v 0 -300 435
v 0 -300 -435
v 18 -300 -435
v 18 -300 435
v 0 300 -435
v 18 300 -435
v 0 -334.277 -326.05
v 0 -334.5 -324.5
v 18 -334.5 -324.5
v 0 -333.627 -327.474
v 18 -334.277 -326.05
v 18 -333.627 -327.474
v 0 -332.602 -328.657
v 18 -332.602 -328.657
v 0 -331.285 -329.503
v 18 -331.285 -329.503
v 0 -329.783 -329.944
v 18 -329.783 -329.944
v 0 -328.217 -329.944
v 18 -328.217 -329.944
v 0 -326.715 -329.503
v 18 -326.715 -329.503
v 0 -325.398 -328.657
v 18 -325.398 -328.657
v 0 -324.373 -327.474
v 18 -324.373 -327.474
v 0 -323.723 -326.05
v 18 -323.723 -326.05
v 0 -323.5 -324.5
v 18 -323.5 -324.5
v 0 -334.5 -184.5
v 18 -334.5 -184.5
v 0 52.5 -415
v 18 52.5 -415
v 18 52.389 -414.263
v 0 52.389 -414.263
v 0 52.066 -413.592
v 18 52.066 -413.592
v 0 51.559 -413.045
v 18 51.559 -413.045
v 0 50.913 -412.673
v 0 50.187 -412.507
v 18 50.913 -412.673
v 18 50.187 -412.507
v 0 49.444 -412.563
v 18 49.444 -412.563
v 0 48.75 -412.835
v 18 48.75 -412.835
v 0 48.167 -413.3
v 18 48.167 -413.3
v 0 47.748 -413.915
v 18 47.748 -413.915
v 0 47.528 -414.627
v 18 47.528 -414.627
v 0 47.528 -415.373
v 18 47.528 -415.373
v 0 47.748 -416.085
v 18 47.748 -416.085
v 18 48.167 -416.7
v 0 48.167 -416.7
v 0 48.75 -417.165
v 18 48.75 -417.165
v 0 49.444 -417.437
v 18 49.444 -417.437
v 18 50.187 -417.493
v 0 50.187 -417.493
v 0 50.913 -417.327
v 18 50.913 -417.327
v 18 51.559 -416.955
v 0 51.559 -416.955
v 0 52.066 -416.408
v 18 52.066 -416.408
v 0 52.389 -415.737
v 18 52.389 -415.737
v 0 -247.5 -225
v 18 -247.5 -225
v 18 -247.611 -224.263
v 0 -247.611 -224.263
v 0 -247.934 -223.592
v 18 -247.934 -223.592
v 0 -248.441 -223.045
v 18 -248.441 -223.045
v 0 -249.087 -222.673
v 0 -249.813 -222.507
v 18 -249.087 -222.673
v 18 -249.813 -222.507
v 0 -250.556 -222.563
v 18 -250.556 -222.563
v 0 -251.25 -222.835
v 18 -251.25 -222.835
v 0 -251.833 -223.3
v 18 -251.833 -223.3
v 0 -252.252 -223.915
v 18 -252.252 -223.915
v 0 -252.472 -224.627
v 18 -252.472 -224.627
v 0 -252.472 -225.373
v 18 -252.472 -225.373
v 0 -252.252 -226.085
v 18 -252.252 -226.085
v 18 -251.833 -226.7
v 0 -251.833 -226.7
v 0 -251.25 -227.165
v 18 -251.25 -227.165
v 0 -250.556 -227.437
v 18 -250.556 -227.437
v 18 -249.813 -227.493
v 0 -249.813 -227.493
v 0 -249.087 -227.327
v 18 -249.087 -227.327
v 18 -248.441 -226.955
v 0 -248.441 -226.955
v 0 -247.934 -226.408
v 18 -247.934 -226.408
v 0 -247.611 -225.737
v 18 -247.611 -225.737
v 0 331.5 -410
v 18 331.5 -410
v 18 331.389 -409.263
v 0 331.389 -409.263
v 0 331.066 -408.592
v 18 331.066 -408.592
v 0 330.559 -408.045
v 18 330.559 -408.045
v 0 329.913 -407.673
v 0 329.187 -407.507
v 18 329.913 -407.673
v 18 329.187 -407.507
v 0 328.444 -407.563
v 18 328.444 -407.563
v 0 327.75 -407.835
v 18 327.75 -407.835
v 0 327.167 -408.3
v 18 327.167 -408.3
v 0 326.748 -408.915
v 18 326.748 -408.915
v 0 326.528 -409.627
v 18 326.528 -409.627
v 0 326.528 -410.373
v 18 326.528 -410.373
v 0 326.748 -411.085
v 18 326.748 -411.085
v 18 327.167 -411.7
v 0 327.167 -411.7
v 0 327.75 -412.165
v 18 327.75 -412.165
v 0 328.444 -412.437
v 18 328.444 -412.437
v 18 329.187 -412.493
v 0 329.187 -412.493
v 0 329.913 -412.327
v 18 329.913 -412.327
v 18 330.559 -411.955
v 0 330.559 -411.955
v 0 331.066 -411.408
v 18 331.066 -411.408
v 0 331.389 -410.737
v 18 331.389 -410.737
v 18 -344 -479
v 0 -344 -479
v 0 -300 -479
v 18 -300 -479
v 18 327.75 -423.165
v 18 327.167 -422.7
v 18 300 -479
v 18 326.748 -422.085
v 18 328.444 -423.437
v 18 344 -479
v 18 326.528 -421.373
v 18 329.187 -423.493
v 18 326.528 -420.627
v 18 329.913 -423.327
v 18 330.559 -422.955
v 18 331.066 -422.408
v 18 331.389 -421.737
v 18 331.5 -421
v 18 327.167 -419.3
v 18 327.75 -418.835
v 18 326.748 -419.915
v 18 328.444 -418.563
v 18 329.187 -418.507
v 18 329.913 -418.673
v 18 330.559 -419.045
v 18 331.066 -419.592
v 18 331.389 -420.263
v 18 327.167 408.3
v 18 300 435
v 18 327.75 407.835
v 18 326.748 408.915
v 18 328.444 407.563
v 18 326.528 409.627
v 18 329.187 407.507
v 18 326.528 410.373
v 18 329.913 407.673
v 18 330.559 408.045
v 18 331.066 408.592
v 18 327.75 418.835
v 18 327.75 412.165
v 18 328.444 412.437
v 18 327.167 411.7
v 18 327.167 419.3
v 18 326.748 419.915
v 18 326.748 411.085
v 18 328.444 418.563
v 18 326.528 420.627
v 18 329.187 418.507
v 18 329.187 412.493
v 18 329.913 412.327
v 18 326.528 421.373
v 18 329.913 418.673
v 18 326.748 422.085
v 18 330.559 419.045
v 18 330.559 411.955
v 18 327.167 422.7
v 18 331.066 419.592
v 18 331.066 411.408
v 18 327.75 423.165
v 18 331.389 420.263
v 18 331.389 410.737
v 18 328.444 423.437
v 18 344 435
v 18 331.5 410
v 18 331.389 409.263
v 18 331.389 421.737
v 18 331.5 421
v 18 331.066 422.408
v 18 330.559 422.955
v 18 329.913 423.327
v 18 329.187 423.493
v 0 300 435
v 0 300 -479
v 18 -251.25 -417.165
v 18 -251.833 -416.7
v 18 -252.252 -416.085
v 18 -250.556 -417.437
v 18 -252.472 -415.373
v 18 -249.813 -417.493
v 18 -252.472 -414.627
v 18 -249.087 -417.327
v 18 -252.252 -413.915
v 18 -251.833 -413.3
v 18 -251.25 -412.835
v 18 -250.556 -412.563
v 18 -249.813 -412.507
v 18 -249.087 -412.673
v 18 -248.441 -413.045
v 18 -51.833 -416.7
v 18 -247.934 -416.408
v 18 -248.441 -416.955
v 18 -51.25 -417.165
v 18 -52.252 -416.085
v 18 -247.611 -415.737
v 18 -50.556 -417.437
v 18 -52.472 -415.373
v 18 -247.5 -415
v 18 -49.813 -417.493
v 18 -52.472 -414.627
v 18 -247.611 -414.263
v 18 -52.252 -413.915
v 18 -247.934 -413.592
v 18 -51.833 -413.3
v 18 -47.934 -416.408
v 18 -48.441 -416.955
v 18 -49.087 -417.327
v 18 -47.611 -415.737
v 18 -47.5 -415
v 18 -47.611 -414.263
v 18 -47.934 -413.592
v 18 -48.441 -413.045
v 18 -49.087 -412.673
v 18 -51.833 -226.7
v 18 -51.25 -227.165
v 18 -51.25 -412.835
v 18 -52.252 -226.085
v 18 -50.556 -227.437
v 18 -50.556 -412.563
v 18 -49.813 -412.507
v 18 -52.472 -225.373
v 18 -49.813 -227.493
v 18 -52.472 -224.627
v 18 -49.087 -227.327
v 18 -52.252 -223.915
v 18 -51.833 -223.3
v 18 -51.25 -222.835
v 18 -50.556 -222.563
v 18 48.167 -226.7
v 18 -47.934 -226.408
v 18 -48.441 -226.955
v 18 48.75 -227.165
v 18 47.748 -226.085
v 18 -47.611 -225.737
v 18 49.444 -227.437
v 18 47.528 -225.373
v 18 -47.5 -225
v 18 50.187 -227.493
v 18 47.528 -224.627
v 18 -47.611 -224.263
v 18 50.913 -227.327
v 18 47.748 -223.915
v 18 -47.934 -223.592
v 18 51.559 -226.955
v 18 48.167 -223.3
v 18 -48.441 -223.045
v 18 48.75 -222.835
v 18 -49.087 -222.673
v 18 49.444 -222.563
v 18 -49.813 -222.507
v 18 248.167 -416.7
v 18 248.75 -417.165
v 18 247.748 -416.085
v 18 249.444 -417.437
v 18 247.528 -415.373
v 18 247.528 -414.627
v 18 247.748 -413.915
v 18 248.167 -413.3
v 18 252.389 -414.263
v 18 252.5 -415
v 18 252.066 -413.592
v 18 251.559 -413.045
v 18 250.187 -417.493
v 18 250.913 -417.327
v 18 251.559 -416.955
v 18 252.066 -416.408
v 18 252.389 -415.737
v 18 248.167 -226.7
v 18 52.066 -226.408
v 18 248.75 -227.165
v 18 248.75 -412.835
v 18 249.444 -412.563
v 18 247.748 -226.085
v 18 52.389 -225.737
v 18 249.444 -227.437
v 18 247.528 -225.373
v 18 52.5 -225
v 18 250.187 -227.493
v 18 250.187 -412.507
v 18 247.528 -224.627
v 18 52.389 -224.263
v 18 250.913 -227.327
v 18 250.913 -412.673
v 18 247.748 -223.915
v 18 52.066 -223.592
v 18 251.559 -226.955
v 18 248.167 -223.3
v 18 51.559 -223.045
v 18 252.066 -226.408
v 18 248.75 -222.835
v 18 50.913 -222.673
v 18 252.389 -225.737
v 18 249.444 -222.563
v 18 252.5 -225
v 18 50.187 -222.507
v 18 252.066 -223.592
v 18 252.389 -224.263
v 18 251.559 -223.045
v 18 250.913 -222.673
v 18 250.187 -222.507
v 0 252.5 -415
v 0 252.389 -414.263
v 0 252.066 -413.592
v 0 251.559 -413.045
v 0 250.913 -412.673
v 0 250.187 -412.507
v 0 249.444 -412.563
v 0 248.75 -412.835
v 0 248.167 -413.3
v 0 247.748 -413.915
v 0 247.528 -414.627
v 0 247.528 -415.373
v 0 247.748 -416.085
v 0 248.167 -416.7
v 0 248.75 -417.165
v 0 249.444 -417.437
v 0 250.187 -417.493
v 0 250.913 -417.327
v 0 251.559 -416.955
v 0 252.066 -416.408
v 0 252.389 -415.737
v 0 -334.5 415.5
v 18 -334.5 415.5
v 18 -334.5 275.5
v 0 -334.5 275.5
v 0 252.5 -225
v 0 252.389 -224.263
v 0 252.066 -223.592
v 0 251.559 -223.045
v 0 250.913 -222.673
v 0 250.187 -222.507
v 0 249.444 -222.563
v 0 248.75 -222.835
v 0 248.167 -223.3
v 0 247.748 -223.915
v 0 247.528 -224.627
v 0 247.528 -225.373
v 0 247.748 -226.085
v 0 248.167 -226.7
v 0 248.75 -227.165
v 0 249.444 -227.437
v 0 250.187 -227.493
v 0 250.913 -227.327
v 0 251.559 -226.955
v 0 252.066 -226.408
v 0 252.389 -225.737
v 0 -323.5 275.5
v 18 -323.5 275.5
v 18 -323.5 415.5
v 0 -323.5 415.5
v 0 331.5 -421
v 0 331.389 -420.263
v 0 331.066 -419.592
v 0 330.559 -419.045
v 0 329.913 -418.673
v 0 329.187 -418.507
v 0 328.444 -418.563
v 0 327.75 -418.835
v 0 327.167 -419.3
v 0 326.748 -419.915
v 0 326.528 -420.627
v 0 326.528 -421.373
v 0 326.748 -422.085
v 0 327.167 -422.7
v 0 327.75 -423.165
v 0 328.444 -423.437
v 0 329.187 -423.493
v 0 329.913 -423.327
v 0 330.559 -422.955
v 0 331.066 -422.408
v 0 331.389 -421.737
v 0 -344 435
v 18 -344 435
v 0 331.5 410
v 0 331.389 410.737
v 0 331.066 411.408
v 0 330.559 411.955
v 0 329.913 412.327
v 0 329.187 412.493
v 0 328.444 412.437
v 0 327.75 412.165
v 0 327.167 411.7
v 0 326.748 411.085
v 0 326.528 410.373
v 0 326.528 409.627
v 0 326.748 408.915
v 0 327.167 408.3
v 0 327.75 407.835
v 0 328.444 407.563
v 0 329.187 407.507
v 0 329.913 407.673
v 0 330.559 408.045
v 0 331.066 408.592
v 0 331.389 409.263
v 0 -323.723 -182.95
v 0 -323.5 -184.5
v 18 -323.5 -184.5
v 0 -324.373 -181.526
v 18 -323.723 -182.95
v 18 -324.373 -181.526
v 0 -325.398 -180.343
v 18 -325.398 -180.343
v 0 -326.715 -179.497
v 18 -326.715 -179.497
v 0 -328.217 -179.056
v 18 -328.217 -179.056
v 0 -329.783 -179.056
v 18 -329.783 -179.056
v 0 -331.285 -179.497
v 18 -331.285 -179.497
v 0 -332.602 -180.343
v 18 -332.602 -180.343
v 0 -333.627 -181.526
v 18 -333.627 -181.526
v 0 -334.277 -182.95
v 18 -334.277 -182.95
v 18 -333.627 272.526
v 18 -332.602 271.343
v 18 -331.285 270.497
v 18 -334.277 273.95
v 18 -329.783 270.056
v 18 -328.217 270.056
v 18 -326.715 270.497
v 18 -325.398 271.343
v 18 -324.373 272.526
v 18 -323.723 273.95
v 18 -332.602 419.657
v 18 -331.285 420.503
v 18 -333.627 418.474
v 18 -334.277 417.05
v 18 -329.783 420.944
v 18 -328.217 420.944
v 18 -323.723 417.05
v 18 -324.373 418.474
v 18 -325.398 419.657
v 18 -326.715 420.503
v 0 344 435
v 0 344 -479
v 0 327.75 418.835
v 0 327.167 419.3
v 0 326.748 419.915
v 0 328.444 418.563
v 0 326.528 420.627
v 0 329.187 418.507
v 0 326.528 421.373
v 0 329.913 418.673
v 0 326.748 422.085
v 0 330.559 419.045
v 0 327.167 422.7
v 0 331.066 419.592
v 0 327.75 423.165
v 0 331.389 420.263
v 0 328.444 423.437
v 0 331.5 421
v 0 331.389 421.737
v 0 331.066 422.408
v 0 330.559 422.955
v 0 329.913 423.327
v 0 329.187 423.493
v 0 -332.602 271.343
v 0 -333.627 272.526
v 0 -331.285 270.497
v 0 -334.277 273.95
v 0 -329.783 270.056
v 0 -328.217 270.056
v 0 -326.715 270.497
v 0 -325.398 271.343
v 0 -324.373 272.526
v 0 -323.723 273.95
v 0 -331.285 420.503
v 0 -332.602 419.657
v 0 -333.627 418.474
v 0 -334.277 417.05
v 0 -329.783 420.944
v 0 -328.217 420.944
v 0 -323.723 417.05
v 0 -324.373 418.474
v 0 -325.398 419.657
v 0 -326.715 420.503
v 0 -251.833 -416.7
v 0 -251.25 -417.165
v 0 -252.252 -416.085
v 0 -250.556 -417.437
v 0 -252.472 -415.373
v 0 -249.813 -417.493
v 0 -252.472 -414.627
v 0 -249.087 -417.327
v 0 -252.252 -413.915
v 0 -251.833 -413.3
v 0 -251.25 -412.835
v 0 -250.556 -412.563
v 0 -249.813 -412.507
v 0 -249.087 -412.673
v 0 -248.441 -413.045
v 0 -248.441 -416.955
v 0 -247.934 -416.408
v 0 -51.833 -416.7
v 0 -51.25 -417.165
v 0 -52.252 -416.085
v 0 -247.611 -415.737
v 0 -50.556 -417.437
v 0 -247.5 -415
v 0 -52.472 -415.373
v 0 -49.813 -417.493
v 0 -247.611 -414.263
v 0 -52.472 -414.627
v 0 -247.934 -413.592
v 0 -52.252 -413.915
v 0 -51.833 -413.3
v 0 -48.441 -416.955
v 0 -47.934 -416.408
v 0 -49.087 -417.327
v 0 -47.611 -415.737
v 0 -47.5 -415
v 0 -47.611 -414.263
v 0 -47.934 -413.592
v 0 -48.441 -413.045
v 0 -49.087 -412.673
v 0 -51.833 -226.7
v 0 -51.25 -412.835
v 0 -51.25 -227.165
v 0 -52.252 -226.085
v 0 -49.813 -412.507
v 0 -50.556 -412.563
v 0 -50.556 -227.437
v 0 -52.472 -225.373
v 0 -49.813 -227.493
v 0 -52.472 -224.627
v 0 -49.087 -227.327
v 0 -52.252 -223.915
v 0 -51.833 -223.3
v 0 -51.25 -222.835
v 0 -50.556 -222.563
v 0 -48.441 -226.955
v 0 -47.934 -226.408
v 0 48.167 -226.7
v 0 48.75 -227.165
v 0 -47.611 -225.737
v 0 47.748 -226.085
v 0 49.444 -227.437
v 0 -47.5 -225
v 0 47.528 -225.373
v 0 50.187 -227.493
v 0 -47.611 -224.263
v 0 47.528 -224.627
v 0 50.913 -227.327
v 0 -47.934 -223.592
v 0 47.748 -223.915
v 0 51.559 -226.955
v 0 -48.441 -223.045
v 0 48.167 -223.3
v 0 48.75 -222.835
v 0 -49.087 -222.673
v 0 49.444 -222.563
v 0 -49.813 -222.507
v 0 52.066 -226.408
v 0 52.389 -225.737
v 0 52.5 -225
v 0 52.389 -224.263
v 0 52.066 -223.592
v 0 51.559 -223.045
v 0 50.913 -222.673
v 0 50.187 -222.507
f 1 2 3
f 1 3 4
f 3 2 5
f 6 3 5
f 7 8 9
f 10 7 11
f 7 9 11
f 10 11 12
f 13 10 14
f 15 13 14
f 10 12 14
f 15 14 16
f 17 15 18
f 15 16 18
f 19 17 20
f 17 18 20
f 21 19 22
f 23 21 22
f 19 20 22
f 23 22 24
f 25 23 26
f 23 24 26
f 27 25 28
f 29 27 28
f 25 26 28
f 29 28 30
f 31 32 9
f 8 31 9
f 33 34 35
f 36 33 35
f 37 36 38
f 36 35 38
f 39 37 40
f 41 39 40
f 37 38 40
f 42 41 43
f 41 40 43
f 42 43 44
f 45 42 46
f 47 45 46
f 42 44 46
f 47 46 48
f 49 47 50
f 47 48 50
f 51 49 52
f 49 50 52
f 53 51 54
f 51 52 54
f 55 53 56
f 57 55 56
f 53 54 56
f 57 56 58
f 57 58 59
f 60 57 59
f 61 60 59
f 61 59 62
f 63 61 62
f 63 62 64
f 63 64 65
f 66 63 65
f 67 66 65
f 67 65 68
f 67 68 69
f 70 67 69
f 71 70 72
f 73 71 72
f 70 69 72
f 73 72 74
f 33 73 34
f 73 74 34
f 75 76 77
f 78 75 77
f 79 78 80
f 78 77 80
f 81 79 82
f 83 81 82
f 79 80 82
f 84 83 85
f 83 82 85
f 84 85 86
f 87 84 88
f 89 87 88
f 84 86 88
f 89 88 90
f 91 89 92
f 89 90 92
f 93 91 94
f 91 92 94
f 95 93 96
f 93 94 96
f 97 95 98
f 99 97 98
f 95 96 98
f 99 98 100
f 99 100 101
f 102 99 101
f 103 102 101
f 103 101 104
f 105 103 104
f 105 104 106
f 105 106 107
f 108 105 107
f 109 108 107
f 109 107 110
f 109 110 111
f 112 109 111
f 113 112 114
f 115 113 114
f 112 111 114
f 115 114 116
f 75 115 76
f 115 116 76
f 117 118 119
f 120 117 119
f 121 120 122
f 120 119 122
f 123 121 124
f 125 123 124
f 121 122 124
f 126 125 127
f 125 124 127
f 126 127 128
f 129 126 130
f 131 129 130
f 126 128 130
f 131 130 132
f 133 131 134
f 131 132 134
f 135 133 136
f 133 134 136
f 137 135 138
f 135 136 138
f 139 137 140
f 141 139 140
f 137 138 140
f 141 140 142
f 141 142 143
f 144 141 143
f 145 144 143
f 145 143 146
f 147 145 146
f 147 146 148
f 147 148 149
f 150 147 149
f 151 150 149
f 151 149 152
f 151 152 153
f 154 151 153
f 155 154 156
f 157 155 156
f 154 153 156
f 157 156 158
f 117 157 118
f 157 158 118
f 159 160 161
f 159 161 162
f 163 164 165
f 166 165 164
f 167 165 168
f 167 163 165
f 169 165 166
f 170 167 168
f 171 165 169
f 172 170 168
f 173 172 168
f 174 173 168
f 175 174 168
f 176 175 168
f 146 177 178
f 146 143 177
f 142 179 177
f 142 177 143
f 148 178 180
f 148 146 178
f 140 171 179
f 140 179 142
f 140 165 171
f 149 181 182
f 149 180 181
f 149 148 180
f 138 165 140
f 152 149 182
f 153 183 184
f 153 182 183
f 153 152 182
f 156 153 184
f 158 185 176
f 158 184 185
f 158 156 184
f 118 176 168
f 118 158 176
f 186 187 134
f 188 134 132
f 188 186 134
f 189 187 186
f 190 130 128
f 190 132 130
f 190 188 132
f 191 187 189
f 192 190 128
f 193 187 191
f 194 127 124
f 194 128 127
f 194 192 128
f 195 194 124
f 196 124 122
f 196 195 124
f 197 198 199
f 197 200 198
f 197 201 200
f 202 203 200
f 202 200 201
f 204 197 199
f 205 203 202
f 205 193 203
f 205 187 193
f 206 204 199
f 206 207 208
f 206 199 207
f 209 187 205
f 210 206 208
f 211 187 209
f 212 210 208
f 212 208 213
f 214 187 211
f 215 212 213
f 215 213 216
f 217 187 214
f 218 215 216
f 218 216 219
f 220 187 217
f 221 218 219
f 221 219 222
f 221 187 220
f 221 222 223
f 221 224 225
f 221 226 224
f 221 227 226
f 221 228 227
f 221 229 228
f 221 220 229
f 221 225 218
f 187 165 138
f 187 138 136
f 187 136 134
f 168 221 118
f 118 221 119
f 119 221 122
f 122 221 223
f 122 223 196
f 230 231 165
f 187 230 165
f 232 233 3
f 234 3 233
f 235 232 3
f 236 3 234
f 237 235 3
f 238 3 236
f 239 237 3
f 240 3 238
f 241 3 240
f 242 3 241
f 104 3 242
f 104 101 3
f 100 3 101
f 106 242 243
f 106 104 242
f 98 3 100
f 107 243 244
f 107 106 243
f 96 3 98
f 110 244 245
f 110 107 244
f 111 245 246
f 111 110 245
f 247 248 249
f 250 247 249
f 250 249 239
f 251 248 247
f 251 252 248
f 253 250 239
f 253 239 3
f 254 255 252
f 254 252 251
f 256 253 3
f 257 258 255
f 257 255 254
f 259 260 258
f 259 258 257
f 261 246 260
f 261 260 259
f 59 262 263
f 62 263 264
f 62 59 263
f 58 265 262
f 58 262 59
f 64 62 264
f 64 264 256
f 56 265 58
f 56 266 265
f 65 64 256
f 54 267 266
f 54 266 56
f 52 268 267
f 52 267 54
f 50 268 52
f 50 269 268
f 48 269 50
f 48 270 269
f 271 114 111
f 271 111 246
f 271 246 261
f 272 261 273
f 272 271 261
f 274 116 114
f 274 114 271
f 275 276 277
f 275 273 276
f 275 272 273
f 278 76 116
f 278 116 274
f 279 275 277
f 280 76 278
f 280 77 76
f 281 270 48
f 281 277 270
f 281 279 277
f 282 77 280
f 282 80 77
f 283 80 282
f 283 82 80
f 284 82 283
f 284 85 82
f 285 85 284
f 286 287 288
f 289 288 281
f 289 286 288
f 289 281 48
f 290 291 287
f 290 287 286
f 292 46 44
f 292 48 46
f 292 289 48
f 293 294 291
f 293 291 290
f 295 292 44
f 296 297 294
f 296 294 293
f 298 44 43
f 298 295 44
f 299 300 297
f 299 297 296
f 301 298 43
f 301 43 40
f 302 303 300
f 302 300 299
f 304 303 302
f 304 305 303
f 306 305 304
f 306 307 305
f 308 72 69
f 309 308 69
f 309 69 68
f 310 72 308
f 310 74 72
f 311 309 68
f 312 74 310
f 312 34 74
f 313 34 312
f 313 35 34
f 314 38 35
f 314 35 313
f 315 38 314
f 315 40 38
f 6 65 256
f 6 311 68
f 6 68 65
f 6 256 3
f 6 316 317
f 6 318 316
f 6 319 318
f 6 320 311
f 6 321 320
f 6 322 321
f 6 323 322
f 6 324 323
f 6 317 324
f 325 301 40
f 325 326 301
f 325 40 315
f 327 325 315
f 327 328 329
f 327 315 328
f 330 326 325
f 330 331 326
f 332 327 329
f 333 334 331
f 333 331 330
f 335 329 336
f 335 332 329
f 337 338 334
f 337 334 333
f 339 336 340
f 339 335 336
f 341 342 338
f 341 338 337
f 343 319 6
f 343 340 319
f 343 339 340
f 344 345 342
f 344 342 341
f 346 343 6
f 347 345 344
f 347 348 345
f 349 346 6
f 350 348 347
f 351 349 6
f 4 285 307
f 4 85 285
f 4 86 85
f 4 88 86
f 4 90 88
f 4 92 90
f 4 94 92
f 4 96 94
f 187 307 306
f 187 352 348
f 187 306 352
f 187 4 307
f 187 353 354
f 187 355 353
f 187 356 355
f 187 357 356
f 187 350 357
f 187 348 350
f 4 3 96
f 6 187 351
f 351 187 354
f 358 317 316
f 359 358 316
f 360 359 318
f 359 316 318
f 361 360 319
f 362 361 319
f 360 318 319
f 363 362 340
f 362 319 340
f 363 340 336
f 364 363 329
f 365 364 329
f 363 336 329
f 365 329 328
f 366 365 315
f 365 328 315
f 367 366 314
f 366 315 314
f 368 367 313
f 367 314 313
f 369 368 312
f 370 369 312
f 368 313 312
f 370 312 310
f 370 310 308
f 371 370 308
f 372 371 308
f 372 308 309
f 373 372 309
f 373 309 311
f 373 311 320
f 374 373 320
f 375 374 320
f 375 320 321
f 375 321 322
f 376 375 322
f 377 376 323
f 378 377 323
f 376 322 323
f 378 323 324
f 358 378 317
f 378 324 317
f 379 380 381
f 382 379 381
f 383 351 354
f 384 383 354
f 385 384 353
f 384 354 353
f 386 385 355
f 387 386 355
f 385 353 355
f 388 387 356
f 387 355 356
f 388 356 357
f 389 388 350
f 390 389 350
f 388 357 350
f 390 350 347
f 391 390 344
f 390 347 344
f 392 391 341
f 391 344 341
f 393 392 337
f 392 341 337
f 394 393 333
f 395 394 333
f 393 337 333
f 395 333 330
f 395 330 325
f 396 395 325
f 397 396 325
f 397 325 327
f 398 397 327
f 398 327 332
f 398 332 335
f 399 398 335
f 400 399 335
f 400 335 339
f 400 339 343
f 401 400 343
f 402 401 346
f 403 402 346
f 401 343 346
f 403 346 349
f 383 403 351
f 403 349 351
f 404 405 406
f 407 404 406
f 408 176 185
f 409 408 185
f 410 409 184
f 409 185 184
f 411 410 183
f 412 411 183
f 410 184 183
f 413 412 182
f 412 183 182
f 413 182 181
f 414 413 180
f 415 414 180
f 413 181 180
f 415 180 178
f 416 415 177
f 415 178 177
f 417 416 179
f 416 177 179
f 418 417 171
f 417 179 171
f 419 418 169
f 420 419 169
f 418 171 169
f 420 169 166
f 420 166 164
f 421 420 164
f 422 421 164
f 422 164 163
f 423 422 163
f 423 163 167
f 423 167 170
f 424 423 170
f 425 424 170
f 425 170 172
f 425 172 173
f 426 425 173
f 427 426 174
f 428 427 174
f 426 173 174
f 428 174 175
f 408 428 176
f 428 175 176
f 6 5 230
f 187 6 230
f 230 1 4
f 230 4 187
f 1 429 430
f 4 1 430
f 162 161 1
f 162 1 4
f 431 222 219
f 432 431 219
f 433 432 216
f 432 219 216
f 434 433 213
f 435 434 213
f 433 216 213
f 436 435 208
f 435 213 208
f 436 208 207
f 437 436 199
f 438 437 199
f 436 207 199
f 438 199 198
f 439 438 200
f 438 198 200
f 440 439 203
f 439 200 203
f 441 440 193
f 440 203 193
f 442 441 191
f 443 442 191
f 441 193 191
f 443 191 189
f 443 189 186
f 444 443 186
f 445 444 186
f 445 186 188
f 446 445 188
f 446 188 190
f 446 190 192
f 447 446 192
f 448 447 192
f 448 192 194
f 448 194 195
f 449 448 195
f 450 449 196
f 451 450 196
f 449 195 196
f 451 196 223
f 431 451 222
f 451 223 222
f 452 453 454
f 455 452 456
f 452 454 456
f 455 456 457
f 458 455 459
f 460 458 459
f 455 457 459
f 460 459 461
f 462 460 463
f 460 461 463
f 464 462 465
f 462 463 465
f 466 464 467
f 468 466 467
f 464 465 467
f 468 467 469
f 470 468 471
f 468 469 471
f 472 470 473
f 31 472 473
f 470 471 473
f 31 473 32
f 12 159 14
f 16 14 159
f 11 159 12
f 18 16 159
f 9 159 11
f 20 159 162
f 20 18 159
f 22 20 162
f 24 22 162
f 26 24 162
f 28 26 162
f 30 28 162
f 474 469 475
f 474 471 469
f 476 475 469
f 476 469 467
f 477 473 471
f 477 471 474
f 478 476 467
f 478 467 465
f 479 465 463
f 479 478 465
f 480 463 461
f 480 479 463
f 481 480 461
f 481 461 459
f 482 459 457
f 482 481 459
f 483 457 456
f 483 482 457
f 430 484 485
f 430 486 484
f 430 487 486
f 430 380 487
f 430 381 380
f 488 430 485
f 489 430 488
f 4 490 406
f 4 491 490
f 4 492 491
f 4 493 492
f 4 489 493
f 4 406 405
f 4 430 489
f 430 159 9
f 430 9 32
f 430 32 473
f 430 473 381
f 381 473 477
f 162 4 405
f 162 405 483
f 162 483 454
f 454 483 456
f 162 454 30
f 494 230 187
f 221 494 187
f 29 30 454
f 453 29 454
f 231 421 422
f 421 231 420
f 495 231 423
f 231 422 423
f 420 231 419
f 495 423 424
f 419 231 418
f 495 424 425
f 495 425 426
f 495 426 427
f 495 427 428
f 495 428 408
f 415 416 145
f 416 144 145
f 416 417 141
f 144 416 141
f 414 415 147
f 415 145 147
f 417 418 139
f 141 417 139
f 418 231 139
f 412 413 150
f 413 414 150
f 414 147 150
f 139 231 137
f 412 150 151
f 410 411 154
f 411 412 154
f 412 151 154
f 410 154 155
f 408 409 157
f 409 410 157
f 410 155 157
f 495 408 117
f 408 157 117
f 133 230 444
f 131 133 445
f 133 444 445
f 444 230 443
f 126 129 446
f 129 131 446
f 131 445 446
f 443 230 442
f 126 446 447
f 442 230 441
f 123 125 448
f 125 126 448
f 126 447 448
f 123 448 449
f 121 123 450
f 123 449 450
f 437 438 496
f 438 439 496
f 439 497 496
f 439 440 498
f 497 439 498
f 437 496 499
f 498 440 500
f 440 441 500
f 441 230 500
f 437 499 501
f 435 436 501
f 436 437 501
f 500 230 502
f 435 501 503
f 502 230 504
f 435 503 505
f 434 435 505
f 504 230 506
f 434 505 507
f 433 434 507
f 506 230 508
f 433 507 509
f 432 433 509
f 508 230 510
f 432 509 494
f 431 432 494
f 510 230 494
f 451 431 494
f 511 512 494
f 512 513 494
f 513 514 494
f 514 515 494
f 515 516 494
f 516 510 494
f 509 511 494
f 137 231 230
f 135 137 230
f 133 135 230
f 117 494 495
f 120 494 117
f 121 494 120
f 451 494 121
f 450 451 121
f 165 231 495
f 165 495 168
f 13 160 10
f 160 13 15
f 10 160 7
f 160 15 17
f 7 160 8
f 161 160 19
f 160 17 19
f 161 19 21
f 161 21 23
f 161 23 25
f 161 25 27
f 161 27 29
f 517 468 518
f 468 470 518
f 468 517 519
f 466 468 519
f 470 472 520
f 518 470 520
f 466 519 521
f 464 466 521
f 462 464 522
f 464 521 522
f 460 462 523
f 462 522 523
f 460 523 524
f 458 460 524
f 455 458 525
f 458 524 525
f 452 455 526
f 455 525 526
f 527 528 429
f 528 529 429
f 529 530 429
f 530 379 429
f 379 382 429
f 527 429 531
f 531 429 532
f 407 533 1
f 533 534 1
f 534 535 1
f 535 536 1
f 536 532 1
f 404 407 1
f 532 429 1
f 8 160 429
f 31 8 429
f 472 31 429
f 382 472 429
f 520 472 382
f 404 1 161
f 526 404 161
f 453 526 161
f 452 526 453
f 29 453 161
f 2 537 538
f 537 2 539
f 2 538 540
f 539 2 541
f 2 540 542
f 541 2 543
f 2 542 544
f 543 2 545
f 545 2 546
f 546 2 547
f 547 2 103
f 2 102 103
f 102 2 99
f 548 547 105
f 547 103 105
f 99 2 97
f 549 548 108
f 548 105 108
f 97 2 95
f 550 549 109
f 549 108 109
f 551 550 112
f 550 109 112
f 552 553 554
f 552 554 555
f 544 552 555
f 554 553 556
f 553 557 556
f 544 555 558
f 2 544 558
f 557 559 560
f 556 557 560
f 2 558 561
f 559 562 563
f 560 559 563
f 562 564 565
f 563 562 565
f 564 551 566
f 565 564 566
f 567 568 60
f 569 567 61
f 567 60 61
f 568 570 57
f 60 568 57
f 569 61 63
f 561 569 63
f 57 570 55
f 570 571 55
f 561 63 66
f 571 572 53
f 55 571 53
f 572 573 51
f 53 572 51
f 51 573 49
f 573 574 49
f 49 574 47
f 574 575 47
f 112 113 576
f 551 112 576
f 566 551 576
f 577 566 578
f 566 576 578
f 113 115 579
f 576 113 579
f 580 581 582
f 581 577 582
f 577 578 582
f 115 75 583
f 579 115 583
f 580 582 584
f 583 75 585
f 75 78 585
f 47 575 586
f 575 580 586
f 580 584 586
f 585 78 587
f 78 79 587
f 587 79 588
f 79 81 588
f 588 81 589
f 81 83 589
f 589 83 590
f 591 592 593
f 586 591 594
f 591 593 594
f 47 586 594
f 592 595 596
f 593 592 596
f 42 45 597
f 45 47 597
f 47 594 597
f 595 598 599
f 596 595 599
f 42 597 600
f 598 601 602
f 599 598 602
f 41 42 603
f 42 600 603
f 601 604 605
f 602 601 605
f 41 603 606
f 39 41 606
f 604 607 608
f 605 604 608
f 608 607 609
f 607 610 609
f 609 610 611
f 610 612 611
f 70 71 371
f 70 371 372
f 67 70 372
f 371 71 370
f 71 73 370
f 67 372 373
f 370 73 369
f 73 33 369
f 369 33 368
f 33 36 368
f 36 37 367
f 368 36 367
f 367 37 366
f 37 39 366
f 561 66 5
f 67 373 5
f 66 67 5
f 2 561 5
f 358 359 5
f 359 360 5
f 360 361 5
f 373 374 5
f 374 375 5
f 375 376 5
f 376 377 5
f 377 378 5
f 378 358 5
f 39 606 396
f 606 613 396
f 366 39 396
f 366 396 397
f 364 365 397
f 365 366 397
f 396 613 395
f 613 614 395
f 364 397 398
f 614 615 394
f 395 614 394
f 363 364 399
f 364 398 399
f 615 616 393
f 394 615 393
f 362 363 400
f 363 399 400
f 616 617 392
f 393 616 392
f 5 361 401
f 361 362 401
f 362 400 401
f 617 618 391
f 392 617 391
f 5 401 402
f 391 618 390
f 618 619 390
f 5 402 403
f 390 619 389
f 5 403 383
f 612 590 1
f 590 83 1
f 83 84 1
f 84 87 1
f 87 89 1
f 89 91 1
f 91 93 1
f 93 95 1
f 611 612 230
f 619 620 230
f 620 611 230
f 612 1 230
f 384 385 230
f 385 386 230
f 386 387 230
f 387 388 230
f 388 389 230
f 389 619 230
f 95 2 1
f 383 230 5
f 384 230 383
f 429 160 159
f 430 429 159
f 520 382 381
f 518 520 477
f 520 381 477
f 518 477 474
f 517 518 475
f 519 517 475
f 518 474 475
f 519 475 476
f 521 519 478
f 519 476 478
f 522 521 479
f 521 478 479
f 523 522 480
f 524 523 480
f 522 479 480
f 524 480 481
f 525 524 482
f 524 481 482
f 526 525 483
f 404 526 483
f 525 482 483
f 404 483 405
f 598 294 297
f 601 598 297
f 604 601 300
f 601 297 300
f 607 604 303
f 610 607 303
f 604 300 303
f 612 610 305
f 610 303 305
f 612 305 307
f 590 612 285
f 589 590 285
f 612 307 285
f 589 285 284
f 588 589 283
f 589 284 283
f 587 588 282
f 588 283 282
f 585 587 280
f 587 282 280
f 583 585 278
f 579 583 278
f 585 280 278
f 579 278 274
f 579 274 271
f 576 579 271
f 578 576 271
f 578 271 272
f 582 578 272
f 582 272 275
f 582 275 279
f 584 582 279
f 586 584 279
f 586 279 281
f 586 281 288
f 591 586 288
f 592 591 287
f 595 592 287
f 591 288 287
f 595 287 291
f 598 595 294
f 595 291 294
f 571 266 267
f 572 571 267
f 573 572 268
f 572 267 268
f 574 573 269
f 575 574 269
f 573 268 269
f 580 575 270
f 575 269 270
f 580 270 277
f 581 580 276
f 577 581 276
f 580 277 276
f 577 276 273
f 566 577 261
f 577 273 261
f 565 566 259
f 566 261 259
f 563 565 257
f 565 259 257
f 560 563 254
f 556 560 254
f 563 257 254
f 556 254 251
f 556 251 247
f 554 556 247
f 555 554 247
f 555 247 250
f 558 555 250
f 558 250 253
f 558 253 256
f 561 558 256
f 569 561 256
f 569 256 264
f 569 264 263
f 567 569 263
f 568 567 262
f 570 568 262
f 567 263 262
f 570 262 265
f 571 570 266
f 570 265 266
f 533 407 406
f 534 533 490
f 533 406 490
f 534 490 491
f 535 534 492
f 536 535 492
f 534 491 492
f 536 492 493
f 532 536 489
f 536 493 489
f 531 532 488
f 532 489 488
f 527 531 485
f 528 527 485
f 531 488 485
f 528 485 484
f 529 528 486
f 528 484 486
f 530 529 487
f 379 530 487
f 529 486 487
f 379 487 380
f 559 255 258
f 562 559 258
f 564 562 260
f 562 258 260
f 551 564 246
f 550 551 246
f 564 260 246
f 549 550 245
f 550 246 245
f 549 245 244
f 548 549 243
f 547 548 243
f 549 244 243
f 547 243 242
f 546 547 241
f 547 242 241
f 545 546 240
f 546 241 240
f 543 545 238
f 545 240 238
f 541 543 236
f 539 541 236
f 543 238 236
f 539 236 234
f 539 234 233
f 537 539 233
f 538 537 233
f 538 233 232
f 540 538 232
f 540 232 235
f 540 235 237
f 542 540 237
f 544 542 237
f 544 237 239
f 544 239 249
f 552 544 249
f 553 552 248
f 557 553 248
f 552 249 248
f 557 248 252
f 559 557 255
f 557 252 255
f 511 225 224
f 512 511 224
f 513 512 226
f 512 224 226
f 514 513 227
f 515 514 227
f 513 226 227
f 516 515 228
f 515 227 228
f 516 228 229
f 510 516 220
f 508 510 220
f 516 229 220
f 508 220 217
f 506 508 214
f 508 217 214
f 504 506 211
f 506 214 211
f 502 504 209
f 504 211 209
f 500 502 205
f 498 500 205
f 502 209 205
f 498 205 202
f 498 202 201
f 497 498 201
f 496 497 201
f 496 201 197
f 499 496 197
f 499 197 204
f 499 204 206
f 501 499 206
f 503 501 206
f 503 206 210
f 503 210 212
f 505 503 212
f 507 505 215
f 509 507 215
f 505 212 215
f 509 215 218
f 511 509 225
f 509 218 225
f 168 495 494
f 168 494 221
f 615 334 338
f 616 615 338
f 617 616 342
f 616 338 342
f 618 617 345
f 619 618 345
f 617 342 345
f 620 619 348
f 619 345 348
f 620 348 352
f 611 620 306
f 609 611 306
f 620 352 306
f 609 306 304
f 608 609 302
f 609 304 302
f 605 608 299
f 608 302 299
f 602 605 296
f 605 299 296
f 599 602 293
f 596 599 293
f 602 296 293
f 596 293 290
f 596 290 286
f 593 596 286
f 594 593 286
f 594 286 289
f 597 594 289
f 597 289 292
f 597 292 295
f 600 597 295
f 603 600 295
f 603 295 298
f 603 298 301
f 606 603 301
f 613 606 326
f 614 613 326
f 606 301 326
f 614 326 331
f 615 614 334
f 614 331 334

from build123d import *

# Parameters (mm, degrees)
F0_W     = 600
F0_H     = 870
F1_DEPTH = 18
F2_W     = 18
F2_H     = 44
F3_DEPTH = 914
F4_R     = 2.5
F5_DEPTH = 18


with BuildPart() as f1:
    # F0 (on Right) → F1 (new body)
    with BuildSketch(Plane.YZ):
        Rectangle(F0_W, F0_H)
    extrude(amount=F1_DEPTH)


with BuildPart() as f3:
    # F2 (on face) → F3 (new body)
    with BuildSketch(Plane.XY.offset(435)):
        with Locations((9, -322)):
            Rectangle(F2_W, F2_H)
        with Locations((9, 322)):
            Rectangle(F2_W, F2_H)
    extrude(amount=-F3_DEPTH)


with BuildPart() as f5_tool:
    # F4 (on face) → F5 (new body)
    with BuildSketch(Plane.YZ.offset(18)):
        with Locations((250, -415)):
            Circle(F4_R)
        with Locations((250, -225)):
            Circle(F4_R)
        with Locations((50, -225)):
            Circle(F4_R)
        with Locations((50, -415)):
            Circle(F4_R)
        with Locations((-250, -415)):
            Circle(F4_R)
        with Locations((-50, -225)):
            Circle(F4_R)
        with Locations((-50, -415)):
            Circle(F4_R)
        with Locations((-250, -225)):
            Circle(F4_R)
        with Locations((329, 421)):
            Circle(F4_R)
        with Locations((329, 410)):
            Circle(F4_R)
        with Locations((329, -410)):
            Circle(F4_R)
        with Locations((329, -421)):
            Circle(F4_R)
        with BuildLine():
            Line((-323.5, 345.5), (-323.5, 415.5))
            ThreePointArc((-323.5, 415.5), (-329, 421), (-334.5, 415.5))
            Line((-334.5, 415.5), (-334.5, 345.5))
            Line((-334.5, 345.5), (-323.5, 345.5))
        make_face()
        with BuildLine():
            Line((-323.5, 275.5), (-323.5, 345.5))
            Line((-323.5, 345.5), (-334.5, 345.5))
            Line((-334.5, 345.5), (-334.5, 275.5))
            ThreePointArc((-334.5, 275.5), (-329, 270), (-323.5, 275.5))
        make_face()
        with BuildLine():
            ThreePointArc((-323.5, -184.5), (-329, -179), (-334.5, -184.5))
            Line((-334.5, -184.5), (-334.5, -324.5))
            ThreePointArc((-334.5, -324.5), (-329, -330), (-323.5, -324.5))
            Line((-323.5, -324.5), (-323.5, -184.5))
        make_face()
    extrude(amount=-F5_DEPTH)


with BuildPart() as f1_1:
    add(f1.part)

    # F5: cut by f5_tool
    add(f5_tool.part, mode=Mode.SUBTRACT)


with BuildPart() as f3_1:
    add(f3.part)

    # F5: cut by f5_tool
    add(f5_tool.part, mode=Mode.SUBTRACT)


solid = Compound([f1_1.part, f3_1.part])
